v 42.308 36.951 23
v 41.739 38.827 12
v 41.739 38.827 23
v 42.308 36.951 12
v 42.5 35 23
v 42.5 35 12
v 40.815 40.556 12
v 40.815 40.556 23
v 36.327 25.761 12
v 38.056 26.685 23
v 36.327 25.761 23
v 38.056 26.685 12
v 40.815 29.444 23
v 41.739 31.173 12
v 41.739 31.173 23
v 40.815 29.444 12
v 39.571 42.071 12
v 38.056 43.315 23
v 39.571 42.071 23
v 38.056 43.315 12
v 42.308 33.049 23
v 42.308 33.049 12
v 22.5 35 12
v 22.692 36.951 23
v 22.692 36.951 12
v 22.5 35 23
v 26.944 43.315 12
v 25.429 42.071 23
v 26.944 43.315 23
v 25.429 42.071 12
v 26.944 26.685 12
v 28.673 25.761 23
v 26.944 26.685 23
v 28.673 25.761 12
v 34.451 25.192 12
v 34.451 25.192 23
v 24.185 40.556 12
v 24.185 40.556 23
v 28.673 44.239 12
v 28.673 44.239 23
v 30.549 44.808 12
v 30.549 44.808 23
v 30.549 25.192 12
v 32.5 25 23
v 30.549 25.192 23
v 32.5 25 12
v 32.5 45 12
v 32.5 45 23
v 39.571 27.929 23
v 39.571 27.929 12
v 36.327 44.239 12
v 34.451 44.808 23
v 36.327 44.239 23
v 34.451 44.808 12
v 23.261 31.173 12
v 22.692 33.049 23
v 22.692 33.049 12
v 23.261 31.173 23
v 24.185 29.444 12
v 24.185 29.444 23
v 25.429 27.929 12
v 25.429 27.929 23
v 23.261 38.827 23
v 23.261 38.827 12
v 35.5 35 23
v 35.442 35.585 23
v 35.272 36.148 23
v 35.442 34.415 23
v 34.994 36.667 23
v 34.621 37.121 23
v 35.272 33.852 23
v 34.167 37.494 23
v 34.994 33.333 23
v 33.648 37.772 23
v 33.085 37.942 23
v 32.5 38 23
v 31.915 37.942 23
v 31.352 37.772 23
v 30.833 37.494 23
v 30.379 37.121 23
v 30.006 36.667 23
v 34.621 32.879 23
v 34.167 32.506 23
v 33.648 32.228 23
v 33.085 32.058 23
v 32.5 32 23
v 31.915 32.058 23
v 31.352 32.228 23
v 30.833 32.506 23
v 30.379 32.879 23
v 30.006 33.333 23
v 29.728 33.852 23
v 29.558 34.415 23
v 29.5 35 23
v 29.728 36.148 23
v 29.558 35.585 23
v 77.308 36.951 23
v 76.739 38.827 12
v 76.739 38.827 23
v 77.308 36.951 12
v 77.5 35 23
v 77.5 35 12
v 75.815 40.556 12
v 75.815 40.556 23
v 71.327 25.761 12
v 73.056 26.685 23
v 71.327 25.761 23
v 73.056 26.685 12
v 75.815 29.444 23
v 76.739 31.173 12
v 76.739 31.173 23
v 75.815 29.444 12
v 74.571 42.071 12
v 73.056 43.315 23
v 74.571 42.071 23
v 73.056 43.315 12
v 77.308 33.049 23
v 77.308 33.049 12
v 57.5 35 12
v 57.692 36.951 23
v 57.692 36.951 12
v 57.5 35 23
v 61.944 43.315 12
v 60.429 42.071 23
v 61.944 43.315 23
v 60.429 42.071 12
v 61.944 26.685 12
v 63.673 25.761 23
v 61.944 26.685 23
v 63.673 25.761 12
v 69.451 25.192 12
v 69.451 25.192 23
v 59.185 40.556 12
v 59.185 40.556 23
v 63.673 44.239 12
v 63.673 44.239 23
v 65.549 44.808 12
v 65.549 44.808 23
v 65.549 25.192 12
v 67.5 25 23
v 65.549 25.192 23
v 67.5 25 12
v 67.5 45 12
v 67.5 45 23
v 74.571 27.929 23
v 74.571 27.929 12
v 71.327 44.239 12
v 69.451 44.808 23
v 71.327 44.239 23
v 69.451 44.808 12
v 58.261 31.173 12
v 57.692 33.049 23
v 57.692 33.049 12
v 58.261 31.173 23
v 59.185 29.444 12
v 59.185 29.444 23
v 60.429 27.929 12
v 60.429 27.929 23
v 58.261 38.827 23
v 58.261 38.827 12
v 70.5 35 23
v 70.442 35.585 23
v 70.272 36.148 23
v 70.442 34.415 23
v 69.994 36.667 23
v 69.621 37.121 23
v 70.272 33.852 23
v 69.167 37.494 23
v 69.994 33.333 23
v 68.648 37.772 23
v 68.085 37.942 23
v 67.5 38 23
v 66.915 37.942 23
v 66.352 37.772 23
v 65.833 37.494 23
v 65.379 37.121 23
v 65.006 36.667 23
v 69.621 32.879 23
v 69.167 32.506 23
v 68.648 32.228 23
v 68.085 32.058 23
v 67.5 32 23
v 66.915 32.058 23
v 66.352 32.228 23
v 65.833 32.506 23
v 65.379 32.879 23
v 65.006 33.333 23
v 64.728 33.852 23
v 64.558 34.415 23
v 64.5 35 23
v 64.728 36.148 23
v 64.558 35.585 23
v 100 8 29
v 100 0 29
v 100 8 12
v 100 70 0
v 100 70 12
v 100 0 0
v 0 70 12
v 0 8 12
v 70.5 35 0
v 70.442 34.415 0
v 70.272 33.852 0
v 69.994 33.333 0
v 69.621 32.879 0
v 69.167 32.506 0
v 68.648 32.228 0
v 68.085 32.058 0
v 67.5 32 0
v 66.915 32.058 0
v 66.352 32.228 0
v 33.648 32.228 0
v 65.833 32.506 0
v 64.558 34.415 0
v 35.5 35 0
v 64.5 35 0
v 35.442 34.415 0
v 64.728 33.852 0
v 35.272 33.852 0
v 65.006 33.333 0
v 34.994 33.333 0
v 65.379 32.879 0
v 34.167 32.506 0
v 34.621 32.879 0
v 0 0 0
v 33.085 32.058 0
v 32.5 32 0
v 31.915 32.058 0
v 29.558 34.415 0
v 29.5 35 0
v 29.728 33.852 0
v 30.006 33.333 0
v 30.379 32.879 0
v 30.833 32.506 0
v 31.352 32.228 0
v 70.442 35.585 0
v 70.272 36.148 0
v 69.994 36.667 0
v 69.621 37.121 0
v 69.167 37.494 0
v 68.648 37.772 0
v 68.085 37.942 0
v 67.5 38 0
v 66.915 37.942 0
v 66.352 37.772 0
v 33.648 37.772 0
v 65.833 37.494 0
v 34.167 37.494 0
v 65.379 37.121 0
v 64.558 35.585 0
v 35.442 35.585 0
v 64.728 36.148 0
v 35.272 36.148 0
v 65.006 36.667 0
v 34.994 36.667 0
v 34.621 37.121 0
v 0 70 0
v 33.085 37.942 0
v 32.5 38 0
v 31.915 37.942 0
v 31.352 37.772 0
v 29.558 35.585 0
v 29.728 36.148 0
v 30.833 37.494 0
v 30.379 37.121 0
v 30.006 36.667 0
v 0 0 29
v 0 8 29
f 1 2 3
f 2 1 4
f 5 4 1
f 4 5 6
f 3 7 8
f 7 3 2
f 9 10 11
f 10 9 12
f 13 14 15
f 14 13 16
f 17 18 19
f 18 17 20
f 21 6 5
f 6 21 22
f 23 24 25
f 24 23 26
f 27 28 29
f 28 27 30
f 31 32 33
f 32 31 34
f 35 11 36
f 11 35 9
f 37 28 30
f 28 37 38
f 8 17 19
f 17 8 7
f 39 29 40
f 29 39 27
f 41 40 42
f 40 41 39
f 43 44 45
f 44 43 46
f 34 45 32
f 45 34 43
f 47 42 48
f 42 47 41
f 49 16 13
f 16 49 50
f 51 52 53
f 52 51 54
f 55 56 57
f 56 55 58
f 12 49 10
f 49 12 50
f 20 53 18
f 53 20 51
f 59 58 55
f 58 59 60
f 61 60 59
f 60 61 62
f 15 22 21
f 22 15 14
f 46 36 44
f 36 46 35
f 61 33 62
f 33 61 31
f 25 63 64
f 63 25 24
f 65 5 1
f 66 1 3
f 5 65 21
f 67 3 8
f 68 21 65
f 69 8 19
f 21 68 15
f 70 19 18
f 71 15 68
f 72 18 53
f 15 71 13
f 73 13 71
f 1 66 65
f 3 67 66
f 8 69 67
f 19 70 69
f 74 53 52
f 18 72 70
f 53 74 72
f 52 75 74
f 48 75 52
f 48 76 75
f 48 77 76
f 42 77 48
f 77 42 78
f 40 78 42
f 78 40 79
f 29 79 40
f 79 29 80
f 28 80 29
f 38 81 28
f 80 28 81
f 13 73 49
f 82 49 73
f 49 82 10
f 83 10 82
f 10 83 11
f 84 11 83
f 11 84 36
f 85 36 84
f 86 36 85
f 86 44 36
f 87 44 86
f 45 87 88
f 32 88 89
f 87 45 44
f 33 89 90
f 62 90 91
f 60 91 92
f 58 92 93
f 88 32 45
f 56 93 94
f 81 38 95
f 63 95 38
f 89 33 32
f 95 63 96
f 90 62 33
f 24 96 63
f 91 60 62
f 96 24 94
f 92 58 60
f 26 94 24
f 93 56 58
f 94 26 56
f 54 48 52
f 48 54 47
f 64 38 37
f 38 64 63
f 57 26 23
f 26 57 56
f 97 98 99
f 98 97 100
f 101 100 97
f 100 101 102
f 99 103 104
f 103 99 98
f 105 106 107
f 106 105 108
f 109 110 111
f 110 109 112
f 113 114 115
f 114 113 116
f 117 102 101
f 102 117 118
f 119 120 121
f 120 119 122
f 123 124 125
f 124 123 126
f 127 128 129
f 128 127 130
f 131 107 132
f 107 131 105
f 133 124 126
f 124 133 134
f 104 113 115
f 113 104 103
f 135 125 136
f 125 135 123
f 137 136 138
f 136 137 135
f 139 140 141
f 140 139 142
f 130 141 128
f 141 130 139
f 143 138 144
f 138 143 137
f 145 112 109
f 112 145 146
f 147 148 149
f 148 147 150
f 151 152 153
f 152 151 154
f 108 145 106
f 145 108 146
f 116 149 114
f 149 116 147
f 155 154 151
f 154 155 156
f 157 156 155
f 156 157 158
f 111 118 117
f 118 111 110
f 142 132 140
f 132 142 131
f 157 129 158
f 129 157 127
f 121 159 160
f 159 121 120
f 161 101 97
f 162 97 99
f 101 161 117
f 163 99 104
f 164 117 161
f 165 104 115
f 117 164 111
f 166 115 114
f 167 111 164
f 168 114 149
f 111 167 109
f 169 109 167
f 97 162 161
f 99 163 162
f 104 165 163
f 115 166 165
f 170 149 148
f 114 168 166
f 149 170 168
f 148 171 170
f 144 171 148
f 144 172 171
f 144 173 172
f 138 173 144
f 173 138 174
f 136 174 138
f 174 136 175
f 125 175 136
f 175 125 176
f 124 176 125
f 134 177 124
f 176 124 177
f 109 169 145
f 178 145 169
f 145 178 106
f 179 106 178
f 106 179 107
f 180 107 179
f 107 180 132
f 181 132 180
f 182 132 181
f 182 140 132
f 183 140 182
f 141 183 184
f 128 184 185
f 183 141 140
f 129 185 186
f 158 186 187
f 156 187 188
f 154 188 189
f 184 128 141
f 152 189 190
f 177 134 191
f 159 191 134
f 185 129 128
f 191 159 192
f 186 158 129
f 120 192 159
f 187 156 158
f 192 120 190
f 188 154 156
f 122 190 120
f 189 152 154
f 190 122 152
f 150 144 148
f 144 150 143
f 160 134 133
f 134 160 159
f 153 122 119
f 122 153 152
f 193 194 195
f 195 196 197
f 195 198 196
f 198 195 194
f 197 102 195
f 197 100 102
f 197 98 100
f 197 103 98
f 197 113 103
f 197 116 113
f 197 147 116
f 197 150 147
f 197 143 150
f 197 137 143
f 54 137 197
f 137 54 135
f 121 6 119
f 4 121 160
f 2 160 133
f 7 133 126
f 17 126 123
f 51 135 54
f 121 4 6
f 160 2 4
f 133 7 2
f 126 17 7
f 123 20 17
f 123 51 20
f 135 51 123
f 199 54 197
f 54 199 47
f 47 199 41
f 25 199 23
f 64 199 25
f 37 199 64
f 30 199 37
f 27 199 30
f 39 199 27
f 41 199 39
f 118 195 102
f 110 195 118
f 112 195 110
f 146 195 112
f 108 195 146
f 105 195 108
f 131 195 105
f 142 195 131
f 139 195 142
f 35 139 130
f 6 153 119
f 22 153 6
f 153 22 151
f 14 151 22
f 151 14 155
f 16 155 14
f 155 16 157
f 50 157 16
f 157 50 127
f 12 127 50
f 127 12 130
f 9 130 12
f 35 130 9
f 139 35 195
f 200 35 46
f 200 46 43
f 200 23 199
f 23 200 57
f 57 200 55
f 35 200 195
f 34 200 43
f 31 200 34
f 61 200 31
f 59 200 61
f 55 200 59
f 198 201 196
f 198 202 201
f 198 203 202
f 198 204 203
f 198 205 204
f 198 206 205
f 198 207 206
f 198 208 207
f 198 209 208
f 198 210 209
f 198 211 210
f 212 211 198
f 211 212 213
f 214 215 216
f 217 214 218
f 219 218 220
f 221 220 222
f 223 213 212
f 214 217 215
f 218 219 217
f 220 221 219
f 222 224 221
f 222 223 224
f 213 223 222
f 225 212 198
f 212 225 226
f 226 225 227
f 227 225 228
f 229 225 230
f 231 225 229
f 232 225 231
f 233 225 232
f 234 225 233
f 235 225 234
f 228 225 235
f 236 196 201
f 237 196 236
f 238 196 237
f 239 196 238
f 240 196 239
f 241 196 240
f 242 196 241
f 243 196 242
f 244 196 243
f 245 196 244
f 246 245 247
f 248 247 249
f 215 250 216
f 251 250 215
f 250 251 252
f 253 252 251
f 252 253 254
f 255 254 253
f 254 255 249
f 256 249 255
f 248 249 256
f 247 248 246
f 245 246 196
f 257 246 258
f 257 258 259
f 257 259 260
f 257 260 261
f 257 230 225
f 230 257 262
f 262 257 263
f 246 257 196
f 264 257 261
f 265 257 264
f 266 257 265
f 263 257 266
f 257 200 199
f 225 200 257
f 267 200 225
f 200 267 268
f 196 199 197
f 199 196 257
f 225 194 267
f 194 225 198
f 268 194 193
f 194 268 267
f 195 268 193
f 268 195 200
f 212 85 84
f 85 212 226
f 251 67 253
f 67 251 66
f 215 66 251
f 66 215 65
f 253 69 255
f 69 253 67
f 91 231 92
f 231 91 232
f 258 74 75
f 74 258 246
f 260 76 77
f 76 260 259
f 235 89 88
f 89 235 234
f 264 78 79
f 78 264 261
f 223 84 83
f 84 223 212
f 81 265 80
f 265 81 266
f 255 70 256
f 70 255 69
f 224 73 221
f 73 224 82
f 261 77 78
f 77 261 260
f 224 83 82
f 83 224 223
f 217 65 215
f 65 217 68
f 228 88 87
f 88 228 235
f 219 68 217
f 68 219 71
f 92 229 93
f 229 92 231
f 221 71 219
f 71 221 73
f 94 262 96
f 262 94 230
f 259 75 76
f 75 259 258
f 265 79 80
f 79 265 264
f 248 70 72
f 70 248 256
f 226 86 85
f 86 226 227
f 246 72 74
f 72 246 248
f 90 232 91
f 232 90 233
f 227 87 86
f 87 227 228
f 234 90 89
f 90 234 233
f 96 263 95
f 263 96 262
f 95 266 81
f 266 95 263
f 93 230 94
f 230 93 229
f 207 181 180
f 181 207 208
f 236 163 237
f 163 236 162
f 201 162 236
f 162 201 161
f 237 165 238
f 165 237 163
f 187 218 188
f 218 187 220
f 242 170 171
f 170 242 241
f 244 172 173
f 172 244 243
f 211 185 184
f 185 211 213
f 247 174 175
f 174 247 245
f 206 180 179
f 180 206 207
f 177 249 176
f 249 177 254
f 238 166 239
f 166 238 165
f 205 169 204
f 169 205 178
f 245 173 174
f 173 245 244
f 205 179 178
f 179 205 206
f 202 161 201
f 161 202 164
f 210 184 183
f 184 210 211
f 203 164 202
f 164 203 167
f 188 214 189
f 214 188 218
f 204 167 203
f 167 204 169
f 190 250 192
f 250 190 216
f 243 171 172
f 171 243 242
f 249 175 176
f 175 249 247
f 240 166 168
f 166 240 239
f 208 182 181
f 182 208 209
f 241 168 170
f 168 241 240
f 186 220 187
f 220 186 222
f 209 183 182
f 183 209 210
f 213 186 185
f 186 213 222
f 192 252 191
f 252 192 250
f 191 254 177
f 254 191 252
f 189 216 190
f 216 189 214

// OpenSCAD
$fn = 32;

// ----------------------------------------------------------------------
// Drill jig: fence jig
// ----------------------------------------------------------------------

// --- parameters (mm) ---
plate_l = 100;            // plate length, X
plate_w = 70;             // plate width, Y
plate_t = 12;             // plate thickness
boss_d = 20;              // guide boss diameter
boss_h = 12;              // boss height above the plate
guide_d = 6;              // guide hole diameter
boss_pitch = 35;          // boss pitch
fence_h = 18;             // fence height above the plate
fence_t = 8;              // fence thickness

n_boss = 2;  // guide bosses
boss_x0 = (plate_l - (n_boss - 1) * boss_pitch) / 2;  // first boss X
boss_top = plate_t - 1 + boss_h;  // boss crown height
fence_top = plate_t - 1 + fence_h;  // fence crown height
total_h = max([fence_top, boss_top]);  // overall height

difference() {
  union() {
  cube([plate_l, plate_w, plate_t]);
  for (i = [0 : n_boss - 1])
    translate([boss_x0 + i * boss_pitch, plate_w / 2, plate_t - 1])
      cylinder(h = boss_h, d = boss_d);
  translate([0, 0, plate_t - 1]) cube([plate_l, fence_t, fence_h]);
  }
  for (i = [0 : n_boss - 1])
    translate([boss_x0 + i * boss_pitch, plate_w / 2, -1])
      cylinder(h = plate_t + boss_h, d = guide_d);
}
